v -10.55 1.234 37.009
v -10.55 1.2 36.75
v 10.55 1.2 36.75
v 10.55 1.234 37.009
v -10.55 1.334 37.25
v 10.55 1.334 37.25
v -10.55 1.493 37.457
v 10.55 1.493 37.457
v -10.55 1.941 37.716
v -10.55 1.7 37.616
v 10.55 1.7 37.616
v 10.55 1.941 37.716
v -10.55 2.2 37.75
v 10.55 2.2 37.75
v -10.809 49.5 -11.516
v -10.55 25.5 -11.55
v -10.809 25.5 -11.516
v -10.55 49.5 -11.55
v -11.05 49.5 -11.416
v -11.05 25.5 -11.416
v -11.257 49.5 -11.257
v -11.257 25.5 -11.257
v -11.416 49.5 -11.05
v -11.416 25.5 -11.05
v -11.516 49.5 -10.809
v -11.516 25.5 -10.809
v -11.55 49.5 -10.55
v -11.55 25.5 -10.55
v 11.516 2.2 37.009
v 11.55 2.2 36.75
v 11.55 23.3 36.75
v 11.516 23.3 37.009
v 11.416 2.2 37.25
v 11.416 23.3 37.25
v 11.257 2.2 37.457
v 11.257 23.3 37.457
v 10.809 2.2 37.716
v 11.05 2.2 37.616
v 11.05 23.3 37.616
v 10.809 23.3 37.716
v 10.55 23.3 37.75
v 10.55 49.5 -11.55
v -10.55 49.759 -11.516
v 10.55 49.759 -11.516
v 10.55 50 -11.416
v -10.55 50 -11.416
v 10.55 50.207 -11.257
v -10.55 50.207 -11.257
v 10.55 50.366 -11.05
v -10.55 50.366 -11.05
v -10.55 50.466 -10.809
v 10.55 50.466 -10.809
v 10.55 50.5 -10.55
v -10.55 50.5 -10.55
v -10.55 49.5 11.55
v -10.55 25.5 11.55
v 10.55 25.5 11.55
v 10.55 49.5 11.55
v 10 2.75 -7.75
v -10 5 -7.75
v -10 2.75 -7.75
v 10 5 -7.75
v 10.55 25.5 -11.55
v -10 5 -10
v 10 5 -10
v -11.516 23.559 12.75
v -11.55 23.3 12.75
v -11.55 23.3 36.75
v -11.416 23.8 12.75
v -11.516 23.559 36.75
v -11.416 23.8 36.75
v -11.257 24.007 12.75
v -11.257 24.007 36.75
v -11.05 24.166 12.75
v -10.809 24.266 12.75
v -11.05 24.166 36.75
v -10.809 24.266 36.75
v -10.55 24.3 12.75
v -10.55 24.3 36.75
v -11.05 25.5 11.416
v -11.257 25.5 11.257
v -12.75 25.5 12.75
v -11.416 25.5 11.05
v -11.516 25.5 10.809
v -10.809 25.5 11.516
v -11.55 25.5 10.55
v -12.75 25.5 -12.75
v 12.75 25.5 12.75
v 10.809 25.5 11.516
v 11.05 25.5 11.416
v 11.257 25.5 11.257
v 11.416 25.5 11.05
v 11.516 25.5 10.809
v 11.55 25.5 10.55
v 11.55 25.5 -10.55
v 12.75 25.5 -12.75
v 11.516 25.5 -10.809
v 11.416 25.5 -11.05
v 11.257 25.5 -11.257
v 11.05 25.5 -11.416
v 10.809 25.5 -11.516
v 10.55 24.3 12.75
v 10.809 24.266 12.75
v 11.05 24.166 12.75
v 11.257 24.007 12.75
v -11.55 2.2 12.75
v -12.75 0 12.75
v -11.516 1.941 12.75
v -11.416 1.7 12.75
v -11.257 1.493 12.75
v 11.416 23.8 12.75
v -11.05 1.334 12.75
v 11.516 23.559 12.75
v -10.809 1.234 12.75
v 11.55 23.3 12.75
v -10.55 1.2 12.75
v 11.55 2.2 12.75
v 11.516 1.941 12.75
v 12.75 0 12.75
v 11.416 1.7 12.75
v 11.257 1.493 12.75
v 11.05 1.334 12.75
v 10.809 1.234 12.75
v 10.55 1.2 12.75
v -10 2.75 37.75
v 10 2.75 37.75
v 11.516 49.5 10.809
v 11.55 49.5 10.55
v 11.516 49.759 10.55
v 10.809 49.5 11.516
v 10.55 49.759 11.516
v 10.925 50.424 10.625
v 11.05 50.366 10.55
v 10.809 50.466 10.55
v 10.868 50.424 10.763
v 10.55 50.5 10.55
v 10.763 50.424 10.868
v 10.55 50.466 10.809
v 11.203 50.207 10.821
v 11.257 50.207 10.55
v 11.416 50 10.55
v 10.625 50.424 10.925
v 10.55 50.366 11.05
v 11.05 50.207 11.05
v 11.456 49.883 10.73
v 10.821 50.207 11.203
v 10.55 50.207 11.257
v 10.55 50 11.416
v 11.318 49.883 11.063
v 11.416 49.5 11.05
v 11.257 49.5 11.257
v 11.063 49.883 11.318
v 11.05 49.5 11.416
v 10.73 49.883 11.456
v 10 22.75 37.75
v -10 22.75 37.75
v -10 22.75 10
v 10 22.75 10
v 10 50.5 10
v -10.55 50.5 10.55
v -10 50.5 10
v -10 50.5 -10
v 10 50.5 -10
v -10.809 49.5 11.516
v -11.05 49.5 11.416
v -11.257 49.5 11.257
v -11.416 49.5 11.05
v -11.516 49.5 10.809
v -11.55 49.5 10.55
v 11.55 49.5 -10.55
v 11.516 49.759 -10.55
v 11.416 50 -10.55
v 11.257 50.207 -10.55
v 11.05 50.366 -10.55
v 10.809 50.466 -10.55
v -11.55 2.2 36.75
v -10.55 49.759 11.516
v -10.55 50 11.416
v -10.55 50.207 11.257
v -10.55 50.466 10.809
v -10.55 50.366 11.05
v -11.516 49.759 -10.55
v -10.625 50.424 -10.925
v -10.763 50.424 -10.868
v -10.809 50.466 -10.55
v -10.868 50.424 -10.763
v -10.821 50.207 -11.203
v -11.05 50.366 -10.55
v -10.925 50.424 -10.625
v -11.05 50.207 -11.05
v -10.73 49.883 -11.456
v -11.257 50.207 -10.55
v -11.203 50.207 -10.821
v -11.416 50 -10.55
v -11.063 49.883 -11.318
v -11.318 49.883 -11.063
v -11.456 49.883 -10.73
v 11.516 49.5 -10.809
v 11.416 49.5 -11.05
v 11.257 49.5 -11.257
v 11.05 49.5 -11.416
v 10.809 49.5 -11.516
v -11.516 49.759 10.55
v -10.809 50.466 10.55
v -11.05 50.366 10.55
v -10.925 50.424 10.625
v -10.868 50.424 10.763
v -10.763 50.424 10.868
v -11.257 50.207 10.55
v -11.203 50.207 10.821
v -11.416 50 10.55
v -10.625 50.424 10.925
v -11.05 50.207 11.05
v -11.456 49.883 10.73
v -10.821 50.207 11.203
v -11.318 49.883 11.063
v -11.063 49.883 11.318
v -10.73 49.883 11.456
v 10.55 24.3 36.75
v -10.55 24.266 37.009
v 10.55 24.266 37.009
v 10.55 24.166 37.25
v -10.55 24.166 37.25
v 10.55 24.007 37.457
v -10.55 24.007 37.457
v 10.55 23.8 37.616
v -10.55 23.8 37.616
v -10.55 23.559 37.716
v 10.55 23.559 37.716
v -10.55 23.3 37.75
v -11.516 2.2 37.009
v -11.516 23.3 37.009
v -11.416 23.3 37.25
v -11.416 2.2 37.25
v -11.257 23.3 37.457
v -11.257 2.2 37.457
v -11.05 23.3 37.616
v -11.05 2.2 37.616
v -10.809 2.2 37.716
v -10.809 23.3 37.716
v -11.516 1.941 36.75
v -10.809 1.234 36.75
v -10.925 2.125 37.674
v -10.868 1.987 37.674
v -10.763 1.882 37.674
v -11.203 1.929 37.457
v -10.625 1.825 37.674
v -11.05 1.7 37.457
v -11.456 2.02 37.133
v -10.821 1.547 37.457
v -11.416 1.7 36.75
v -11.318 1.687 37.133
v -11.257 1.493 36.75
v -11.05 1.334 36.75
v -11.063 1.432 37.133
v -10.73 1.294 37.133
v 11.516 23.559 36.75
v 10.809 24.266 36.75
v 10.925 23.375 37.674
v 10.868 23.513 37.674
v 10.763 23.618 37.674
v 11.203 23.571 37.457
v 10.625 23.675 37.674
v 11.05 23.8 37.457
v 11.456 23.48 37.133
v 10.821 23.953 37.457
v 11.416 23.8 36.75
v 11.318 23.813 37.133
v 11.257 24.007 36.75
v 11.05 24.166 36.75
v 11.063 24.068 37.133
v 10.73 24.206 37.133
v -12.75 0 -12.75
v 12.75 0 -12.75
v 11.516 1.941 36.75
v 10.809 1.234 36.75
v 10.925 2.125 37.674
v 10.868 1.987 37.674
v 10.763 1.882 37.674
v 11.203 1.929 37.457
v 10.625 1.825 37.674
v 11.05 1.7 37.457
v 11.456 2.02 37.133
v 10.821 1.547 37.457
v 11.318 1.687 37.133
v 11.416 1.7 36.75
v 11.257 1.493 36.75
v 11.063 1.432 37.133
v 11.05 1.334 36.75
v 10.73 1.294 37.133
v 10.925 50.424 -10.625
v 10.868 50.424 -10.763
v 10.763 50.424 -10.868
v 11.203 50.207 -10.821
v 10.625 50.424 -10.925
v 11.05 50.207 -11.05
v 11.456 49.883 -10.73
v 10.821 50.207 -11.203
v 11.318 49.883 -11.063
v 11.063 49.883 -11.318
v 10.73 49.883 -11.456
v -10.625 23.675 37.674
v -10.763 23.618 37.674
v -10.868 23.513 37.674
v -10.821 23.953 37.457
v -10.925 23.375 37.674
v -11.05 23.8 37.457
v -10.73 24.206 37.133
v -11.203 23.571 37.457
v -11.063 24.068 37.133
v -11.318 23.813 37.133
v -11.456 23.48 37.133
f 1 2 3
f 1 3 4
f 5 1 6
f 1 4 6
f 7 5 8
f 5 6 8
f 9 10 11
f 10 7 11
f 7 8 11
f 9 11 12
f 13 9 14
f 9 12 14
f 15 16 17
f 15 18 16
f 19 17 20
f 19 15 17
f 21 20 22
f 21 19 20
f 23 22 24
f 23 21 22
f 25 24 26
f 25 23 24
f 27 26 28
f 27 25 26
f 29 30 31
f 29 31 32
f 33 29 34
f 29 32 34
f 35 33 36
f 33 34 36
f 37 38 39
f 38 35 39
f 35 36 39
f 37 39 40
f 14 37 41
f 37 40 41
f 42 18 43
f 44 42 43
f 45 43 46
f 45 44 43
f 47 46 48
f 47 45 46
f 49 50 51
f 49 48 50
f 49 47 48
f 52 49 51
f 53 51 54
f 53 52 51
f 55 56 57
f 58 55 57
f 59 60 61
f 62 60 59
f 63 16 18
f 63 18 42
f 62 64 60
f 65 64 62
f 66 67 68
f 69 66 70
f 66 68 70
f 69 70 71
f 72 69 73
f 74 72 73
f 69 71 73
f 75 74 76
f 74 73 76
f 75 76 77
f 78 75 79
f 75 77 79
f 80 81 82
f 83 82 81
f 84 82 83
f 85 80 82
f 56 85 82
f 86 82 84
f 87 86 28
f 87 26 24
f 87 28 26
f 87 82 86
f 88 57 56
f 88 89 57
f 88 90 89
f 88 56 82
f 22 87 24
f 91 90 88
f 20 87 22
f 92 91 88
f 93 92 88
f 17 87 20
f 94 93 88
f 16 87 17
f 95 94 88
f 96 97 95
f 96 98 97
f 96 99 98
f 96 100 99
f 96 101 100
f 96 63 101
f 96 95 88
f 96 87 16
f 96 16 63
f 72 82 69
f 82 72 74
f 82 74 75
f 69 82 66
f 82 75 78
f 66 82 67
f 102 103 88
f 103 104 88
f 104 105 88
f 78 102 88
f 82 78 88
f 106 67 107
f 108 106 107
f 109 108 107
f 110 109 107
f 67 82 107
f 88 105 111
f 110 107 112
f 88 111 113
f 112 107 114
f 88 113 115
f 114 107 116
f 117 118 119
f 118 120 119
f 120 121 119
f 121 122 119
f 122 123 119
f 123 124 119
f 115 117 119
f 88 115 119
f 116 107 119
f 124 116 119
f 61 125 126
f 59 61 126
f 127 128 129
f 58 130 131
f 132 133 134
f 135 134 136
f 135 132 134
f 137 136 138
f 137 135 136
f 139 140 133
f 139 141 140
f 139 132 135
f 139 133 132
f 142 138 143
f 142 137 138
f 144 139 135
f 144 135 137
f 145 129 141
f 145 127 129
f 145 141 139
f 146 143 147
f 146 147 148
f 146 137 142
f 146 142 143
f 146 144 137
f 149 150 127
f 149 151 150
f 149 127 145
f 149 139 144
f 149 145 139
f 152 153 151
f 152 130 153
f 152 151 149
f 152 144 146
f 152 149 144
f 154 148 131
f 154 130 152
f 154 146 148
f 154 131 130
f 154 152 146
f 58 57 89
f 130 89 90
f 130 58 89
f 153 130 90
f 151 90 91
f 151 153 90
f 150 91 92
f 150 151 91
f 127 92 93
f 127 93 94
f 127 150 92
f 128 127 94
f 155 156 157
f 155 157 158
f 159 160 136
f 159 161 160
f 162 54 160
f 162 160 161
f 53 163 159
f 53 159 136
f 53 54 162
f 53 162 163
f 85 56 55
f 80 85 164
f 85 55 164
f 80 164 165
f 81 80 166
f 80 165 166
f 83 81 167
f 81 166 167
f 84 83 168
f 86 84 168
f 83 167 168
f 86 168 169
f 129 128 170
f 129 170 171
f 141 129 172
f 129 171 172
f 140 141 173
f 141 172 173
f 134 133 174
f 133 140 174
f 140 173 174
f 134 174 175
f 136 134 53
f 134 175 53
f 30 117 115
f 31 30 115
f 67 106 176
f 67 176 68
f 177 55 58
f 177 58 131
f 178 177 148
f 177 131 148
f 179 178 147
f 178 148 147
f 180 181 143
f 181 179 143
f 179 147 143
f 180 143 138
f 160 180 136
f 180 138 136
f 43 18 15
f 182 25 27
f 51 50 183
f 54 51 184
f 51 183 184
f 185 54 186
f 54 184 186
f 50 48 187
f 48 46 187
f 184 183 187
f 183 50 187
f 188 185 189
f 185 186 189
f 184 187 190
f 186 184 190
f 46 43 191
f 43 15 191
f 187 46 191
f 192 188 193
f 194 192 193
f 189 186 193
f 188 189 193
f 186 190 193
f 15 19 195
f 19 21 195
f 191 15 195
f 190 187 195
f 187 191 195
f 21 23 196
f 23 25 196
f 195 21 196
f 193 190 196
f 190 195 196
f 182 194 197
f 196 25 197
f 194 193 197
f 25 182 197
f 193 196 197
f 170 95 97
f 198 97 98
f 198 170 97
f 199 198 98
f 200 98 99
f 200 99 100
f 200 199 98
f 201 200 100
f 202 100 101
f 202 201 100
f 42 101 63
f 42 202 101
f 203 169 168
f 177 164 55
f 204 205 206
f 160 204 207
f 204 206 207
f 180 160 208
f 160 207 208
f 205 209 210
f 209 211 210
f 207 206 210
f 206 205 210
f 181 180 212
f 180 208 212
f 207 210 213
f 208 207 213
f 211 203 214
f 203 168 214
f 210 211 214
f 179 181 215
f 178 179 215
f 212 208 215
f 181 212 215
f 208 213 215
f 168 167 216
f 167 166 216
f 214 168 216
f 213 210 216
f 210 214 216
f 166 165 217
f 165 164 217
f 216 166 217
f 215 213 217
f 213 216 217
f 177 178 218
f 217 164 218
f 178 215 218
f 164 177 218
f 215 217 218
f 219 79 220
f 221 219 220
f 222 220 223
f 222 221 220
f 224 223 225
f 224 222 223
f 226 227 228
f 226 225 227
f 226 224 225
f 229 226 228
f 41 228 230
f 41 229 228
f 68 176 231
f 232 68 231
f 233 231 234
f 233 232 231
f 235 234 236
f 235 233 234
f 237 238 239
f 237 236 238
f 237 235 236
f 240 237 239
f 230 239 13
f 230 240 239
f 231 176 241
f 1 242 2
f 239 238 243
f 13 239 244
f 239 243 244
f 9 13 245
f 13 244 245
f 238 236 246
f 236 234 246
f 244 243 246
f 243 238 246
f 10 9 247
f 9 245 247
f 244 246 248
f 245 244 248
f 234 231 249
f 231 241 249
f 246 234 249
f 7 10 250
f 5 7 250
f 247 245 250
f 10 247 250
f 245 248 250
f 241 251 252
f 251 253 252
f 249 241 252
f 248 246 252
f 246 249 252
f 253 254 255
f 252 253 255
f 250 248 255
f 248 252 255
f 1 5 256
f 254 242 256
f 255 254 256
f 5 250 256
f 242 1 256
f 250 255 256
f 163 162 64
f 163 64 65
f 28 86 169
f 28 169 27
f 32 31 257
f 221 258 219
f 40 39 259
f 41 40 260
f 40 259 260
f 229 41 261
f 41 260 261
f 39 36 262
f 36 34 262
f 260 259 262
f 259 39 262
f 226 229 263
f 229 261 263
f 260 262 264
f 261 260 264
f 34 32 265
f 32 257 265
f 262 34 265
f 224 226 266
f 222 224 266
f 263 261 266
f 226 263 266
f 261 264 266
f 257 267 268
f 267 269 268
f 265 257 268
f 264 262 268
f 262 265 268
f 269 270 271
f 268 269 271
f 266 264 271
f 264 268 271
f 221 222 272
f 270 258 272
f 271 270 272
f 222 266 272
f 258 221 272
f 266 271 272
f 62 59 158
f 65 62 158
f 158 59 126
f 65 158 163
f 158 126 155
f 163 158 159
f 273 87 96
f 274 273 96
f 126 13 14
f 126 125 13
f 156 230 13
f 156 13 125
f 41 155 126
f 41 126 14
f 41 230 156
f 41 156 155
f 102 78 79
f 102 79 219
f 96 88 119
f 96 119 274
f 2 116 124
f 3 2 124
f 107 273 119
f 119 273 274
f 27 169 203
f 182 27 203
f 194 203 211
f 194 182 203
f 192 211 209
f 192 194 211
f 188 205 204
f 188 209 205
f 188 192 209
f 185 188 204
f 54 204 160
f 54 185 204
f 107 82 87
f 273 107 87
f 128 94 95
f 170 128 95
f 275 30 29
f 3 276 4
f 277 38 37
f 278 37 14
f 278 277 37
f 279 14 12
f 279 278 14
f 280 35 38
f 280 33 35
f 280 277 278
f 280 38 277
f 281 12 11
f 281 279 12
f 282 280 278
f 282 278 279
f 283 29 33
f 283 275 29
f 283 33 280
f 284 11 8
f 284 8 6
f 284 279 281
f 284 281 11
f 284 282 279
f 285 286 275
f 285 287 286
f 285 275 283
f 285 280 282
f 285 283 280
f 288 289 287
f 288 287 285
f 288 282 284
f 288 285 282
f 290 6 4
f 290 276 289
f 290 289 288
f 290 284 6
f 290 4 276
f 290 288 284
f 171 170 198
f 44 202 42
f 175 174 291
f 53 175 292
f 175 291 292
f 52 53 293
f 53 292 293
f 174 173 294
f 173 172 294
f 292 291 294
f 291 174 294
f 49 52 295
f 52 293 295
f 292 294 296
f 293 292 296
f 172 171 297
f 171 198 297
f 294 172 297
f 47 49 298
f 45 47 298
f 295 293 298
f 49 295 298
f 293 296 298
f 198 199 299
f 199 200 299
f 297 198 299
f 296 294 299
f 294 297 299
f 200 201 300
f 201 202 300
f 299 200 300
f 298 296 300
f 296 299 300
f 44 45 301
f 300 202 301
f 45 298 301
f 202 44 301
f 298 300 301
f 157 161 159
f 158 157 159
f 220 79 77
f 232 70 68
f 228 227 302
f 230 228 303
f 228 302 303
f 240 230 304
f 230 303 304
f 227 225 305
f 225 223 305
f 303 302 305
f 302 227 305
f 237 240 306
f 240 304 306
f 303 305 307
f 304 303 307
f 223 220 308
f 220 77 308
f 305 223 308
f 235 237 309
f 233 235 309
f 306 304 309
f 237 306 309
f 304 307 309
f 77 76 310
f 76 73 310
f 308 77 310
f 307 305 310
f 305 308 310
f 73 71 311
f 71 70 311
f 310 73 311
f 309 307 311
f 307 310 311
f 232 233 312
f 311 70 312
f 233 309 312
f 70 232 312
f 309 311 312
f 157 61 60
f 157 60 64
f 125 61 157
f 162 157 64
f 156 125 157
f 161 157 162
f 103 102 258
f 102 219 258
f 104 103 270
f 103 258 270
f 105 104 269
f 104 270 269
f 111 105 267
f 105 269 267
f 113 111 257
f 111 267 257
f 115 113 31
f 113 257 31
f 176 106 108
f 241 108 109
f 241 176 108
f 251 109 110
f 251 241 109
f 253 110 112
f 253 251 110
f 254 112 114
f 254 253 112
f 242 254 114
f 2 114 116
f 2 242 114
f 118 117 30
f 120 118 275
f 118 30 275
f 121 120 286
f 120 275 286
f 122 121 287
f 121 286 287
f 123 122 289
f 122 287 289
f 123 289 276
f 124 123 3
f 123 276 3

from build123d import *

# Parameters (mm, degrees)
SKETCH1_W           = 25.5
SKETCH1_H           = 25.5
BOSS_EXTRUDE1_DEPTH = 25.5
SKETCH3_W           = 23.1
SKETCH3_H           = 23.1
BOSS_EXTRUDE2_DEPTH = 25
SKETCH5_W           = 23.1
SKETCH5_H           = 23.1
BOSS_EXTRUDE3_DEPTH = 25
SKETCH6_W           = 20
SKETCH6_H           = 20
CUT_EXTRUDE1_DEPTH  = 45.5
SKETCH7_W           = 20
SKETCH7_H           = 20
CUT_EXTRUDE2_DEPTH  = 45.5
FILLET1_R           = 1


with BuildPart() as part:
    # Sketch1 → Boss-Extrude1 (new body)
    with BuildSketch(Plane(origin=(0, 0, 0), x_dir=(1, 0, 0), z_dir=(0, 1, 0))):
        Rectangle(SKETCH1_W, SKETCH1_H)
    extrude(amount=BOSS_EXTRUDE1_DEPTH)

    # Sketch3 → Boss-Extrude2 (add)
    with BuildSketch(Plane(origin=(0, 25.5, 0), x_dir=(1, 0, 0), z_dir=(0, 1, 0))):
        Rectangle(SKETCH3_W, SKETCH3_H)
    extrude(amount=BOSS_EXTRUDE2_DEPTH)

    # Sketch5 → Boss-Extrude3 (add)
    with BuildSketch(Plane.XY.offset(12.75)):
        with Locations((0, 12.75)):
            Rectangle(SKETCH5_W, SKETCH5_H)
    extrude(amount=BOSS_EXTRUDE3_DEPTH)

    # Sketch6 → Cut-Extrude1 (cut)
    with BuildSketch(Plane.XY.offset(37.75)):
        with Locations((0, 12.75)):
            Rectangle(SKETCH6_W, SKETCH6_H)
    extrude(amount=-CUT_EXTRUDE1_DEPTH, mode=Mode.SUBTRACT)

    # Sketch7 → Cut-Extrude2 (cut)
    with BuildSketch(Plane(origin=(0, 50.5, 0), x_dir=(1, 0, 0), z_dir=(0, 1, 0))):
        Rectangle(SKETCH7_W, SKETCH7_H)
    extrude(amount=-CUT_EXTRUDE2_DEPTH, mode=Mode.SUBTRACT)

    # Fillet1
    fillet1_edges = [part.edges().sort_by_distance(p)[0] for p in [
        (11.55, 38, 11.55),
        (11.55, 38, -11.55),
        (-11.55, 38, -11.55),
        (-11.55, 38, 11.55),
        (11.55, 50.5, 0),
        (0, 50.5, -11.55),
        (-11.55, 50.5, 0),
        (0, 50.5, 11.55),
        (11.55, 1.2, 25.25),
        (11.55, 24.3, 25.25),
        (-11.55, 24.3, 25.25),
        (-11.55, 1.2, 25.25),
        (11.55, 12.75, 37.75),
        (0, 24.3, 37.75),
        (-11.55, 12.75, 37.75),
        (0, 1.2, 37.75),
    ]]
    fillet(fillet1_edges, radius=FILLET1_R)


solid = part.part
